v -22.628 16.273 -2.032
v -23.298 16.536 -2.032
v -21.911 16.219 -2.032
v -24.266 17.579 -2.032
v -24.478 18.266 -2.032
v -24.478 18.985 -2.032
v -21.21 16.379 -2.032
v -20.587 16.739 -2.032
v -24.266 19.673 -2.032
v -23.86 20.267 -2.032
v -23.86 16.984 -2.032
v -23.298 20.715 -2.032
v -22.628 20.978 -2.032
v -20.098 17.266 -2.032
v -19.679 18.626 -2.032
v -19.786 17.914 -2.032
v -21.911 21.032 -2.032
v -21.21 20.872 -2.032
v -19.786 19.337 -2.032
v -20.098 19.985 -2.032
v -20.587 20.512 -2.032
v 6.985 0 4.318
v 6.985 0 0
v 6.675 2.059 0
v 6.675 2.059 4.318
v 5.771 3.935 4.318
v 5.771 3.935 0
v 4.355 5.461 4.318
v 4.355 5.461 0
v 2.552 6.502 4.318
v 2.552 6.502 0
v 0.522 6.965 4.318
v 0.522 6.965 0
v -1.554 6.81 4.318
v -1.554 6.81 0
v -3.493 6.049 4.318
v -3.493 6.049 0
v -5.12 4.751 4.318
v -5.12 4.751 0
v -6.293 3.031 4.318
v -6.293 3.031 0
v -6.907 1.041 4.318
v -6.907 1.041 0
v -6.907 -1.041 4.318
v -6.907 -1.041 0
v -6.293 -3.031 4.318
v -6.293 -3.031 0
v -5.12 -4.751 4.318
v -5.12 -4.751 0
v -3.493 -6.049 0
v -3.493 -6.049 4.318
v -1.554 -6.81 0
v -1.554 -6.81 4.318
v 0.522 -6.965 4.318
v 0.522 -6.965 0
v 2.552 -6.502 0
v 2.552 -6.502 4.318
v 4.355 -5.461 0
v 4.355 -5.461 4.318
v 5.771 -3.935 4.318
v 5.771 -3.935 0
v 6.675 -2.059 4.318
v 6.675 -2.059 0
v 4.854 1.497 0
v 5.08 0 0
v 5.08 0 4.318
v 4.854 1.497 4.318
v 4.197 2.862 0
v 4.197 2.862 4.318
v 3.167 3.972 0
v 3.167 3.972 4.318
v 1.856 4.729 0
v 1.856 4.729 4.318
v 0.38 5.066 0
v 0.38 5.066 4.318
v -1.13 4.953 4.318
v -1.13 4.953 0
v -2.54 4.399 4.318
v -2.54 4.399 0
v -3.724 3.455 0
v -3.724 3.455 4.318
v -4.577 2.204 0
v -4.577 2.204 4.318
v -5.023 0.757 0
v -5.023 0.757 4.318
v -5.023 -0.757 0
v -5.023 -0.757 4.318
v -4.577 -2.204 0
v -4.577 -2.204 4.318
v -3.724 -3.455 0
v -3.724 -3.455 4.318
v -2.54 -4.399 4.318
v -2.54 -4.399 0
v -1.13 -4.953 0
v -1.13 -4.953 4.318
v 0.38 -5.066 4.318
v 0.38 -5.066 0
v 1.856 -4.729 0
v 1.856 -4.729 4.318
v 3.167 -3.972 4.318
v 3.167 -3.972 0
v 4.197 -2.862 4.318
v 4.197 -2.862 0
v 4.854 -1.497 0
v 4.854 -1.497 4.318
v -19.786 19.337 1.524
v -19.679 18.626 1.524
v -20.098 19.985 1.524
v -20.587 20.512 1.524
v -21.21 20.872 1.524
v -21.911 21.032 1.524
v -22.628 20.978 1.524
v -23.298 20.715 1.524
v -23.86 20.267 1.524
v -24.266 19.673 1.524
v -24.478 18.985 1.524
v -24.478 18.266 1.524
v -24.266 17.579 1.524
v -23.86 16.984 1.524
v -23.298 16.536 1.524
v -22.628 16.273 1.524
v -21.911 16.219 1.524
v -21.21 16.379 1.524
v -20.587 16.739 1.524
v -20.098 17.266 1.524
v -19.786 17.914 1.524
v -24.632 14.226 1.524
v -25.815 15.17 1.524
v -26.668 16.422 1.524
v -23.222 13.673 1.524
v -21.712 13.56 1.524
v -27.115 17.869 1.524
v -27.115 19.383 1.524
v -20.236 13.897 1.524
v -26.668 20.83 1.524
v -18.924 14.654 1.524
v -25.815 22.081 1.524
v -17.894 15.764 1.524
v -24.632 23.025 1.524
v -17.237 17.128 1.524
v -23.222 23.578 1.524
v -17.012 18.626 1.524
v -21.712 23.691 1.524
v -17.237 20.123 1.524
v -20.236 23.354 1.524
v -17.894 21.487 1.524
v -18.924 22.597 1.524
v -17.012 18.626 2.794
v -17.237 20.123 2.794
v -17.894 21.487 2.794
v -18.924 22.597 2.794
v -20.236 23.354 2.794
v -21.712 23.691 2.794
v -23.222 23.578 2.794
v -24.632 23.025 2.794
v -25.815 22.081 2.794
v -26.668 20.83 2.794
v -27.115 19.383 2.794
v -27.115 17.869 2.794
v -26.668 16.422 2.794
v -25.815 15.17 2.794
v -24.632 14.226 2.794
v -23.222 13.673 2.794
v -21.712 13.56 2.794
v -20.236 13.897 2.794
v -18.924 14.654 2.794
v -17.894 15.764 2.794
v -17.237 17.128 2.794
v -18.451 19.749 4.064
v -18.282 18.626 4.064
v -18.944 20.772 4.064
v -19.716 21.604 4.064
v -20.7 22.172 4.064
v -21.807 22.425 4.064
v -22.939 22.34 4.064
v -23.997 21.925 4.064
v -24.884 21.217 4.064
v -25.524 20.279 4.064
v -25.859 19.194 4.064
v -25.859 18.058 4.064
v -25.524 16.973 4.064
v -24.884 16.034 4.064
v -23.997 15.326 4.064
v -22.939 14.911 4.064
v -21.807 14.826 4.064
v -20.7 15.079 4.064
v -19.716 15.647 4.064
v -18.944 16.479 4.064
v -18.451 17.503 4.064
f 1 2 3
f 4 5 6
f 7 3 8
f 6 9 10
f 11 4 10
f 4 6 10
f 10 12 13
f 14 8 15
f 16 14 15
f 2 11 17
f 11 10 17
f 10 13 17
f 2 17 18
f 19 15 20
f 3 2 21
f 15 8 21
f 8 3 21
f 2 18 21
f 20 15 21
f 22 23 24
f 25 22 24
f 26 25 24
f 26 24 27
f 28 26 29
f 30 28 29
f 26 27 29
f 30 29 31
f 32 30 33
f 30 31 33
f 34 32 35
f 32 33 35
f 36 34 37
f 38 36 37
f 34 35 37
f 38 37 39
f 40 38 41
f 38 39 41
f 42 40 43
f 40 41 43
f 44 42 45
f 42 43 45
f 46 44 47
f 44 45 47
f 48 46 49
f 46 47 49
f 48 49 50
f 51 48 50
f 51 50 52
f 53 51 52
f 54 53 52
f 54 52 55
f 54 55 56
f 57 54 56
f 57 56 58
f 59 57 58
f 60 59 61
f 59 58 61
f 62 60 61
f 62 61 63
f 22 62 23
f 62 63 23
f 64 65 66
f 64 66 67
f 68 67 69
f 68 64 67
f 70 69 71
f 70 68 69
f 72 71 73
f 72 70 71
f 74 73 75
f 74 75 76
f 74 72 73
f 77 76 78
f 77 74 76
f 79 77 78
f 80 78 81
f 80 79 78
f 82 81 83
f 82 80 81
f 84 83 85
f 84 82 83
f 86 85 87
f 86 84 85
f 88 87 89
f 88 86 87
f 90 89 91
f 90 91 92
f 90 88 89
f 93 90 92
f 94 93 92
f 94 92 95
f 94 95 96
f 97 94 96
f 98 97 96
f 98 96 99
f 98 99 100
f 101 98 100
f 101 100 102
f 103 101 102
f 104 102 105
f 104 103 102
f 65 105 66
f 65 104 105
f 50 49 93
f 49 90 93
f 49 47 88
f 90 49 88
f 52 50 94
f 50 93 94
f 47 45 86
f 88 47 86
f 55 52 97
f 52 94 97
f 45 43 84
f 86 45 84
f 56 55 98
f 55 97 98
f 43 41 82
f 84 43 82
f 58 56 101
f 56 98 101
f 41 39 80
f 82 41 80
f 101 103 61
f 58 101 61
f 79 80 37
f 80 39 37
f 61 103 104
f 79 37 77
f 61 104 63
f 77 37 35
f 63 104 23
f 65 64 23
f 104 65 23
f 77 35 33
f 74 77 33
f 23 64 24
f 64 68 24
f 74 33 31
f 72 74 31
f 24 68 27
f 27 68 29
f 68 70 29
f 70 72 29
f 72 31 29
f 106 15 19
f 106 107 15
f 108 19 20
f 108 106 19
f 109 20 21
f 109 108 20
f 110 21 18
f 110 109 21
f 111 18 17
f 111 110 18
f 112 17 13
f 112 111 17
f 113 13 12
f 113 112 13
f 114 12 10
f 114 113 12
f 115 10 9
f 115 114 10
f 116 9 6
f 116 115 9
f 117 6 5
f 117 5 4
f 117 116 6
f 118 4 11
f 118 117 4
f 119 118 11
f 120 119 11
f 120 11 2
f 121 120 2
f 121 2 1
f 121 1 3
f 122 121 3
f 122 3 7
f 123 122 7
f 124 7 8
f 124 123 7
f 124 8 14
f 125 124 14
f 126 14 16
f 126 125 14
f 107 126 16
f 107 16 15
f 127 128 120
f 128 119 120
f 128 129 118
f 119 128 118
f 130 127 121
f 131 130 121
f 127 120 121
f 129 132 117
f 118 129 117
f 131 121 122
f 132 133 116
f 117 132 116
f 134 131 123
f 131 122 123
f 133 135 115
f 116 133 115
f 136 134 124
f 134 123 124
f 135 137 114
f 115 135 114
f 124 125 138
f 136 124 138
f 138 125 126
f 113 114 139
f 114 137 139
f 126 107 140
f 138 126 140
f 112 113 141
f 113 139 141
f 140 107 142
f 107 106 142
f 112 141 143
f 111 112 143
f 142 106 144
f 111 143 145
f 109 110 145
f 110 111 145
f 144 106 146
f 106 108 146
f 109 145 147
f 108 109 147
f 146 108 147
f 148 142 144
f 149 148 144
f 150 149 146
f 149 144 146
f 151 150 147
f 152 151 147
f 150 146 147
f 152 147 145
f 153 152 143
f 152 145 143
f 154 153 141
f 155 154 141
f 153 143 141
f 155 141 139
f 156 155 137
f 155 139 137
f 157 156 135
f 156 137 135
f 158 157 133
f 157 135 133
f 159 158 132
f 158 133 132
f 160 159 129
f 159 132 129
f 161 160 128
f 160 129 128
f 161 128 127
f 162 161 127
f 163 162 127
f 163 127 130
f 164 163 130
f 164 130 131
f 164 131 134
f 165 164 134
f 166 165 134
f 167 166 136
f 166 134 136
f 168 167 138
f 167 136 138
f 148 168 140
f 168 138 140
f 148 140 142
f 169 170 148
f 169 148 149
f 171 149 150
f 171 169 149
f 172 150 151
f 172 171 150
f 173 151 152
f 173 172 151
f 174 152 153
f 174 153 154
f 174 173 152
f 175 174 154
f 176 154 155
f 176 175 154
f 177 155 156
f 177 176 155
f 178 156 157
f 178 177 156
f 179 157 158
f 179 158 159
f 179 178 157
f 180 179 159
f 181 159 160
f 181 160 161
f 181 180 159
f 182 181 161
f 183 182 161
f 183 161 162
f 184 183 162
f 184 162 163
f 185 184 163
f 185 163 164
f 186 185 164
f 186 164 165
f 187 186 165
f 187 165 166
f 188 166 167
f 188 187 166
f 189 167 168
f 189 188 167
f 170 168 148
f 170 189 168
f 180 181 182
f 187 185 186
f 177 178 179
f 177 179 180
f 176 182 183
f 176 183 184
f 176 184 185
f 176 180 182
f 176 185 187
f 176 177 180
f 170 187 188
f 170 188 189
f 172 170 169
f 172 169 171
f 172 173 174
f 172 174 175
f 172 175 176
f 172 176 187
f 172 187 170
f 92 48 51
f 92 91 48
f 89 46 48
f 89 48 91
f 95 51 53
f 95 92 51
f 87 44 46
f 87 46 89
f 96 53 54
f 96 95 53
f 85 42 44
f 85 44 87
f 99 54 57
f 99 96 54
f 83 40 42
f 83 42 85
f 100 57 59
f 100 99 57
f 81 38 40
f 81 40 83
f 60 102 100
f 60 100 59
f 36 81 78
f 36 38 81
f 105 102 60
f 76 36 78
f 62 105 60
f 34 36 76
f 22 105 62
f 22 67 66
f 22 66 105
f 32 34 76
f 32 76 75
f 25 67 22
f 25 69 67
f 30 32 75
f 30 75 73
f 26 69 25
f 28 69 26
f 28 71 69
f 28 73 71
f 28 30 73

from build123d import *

# Parameters (mm, degrees)
F0_R     = 6.985
F0_R_2   = 5.08
F1_DEPTH = 4.318
F2_R     = 2.413
F3_DEPTH = 1.524
F4_R     = 5.08
F4_R_2   = 2.413
F5_DEPTH = 2.54
F6_SIZE  = 1.27
F7_DEPTH = 2.032


with BuildPart() as f1:
    # F0 (on Top) → F1 (new body)
    with BuildSketch(Plane.XY):
        Circle(F0_R)
        Circle(F0_R_2, mode=Mode.SUBTRACT)
    extrude(amount=F1_DEPTH)


with BuildPart() as f3:
    # F2 (on Top) → F3 (new body)
    with BuildSketch(Plane.XY):
        with Locations((-22.0915284008, 18.6256598681)):
            Circle(F2_R)
    extrude(amount=F3_DEPTH)

    # F4 (on face) → F5 (join)
    with BuildSketch(Plane.XY.offset(1.524)):
        with Locations((-22.0915284008, 18.6256598681)):
            Circle(F4_R)
        with Locations((-22.0915284008, 18.6256598681)):
            Circle(F4_R_2, mode=Mode.SUBTRACT)
        with Locations((-22.0915284008, 18.6256598681)):
            Circle(F4_R_2)
    extrude(amount=F5_DEPTH)

    # F6
    f6_edges = [f3.edges().sort_by_distance(p)[0] for p in [
        (-27.171528, 18.62566, 4.064),
    ]]
    chamfer(f6_edges, length=F6_SIZE)

    # F7 (add): a face of the model
    f7_faces = [f3.faces().sort_by_distance(p)[0] for p in [
        (-22.0915284008, 18.6256598681, 0),
    ]]
    extrude(f7_faces, amount=F7_DEPTH)


solid = Compound([f1.part, f3.part])
